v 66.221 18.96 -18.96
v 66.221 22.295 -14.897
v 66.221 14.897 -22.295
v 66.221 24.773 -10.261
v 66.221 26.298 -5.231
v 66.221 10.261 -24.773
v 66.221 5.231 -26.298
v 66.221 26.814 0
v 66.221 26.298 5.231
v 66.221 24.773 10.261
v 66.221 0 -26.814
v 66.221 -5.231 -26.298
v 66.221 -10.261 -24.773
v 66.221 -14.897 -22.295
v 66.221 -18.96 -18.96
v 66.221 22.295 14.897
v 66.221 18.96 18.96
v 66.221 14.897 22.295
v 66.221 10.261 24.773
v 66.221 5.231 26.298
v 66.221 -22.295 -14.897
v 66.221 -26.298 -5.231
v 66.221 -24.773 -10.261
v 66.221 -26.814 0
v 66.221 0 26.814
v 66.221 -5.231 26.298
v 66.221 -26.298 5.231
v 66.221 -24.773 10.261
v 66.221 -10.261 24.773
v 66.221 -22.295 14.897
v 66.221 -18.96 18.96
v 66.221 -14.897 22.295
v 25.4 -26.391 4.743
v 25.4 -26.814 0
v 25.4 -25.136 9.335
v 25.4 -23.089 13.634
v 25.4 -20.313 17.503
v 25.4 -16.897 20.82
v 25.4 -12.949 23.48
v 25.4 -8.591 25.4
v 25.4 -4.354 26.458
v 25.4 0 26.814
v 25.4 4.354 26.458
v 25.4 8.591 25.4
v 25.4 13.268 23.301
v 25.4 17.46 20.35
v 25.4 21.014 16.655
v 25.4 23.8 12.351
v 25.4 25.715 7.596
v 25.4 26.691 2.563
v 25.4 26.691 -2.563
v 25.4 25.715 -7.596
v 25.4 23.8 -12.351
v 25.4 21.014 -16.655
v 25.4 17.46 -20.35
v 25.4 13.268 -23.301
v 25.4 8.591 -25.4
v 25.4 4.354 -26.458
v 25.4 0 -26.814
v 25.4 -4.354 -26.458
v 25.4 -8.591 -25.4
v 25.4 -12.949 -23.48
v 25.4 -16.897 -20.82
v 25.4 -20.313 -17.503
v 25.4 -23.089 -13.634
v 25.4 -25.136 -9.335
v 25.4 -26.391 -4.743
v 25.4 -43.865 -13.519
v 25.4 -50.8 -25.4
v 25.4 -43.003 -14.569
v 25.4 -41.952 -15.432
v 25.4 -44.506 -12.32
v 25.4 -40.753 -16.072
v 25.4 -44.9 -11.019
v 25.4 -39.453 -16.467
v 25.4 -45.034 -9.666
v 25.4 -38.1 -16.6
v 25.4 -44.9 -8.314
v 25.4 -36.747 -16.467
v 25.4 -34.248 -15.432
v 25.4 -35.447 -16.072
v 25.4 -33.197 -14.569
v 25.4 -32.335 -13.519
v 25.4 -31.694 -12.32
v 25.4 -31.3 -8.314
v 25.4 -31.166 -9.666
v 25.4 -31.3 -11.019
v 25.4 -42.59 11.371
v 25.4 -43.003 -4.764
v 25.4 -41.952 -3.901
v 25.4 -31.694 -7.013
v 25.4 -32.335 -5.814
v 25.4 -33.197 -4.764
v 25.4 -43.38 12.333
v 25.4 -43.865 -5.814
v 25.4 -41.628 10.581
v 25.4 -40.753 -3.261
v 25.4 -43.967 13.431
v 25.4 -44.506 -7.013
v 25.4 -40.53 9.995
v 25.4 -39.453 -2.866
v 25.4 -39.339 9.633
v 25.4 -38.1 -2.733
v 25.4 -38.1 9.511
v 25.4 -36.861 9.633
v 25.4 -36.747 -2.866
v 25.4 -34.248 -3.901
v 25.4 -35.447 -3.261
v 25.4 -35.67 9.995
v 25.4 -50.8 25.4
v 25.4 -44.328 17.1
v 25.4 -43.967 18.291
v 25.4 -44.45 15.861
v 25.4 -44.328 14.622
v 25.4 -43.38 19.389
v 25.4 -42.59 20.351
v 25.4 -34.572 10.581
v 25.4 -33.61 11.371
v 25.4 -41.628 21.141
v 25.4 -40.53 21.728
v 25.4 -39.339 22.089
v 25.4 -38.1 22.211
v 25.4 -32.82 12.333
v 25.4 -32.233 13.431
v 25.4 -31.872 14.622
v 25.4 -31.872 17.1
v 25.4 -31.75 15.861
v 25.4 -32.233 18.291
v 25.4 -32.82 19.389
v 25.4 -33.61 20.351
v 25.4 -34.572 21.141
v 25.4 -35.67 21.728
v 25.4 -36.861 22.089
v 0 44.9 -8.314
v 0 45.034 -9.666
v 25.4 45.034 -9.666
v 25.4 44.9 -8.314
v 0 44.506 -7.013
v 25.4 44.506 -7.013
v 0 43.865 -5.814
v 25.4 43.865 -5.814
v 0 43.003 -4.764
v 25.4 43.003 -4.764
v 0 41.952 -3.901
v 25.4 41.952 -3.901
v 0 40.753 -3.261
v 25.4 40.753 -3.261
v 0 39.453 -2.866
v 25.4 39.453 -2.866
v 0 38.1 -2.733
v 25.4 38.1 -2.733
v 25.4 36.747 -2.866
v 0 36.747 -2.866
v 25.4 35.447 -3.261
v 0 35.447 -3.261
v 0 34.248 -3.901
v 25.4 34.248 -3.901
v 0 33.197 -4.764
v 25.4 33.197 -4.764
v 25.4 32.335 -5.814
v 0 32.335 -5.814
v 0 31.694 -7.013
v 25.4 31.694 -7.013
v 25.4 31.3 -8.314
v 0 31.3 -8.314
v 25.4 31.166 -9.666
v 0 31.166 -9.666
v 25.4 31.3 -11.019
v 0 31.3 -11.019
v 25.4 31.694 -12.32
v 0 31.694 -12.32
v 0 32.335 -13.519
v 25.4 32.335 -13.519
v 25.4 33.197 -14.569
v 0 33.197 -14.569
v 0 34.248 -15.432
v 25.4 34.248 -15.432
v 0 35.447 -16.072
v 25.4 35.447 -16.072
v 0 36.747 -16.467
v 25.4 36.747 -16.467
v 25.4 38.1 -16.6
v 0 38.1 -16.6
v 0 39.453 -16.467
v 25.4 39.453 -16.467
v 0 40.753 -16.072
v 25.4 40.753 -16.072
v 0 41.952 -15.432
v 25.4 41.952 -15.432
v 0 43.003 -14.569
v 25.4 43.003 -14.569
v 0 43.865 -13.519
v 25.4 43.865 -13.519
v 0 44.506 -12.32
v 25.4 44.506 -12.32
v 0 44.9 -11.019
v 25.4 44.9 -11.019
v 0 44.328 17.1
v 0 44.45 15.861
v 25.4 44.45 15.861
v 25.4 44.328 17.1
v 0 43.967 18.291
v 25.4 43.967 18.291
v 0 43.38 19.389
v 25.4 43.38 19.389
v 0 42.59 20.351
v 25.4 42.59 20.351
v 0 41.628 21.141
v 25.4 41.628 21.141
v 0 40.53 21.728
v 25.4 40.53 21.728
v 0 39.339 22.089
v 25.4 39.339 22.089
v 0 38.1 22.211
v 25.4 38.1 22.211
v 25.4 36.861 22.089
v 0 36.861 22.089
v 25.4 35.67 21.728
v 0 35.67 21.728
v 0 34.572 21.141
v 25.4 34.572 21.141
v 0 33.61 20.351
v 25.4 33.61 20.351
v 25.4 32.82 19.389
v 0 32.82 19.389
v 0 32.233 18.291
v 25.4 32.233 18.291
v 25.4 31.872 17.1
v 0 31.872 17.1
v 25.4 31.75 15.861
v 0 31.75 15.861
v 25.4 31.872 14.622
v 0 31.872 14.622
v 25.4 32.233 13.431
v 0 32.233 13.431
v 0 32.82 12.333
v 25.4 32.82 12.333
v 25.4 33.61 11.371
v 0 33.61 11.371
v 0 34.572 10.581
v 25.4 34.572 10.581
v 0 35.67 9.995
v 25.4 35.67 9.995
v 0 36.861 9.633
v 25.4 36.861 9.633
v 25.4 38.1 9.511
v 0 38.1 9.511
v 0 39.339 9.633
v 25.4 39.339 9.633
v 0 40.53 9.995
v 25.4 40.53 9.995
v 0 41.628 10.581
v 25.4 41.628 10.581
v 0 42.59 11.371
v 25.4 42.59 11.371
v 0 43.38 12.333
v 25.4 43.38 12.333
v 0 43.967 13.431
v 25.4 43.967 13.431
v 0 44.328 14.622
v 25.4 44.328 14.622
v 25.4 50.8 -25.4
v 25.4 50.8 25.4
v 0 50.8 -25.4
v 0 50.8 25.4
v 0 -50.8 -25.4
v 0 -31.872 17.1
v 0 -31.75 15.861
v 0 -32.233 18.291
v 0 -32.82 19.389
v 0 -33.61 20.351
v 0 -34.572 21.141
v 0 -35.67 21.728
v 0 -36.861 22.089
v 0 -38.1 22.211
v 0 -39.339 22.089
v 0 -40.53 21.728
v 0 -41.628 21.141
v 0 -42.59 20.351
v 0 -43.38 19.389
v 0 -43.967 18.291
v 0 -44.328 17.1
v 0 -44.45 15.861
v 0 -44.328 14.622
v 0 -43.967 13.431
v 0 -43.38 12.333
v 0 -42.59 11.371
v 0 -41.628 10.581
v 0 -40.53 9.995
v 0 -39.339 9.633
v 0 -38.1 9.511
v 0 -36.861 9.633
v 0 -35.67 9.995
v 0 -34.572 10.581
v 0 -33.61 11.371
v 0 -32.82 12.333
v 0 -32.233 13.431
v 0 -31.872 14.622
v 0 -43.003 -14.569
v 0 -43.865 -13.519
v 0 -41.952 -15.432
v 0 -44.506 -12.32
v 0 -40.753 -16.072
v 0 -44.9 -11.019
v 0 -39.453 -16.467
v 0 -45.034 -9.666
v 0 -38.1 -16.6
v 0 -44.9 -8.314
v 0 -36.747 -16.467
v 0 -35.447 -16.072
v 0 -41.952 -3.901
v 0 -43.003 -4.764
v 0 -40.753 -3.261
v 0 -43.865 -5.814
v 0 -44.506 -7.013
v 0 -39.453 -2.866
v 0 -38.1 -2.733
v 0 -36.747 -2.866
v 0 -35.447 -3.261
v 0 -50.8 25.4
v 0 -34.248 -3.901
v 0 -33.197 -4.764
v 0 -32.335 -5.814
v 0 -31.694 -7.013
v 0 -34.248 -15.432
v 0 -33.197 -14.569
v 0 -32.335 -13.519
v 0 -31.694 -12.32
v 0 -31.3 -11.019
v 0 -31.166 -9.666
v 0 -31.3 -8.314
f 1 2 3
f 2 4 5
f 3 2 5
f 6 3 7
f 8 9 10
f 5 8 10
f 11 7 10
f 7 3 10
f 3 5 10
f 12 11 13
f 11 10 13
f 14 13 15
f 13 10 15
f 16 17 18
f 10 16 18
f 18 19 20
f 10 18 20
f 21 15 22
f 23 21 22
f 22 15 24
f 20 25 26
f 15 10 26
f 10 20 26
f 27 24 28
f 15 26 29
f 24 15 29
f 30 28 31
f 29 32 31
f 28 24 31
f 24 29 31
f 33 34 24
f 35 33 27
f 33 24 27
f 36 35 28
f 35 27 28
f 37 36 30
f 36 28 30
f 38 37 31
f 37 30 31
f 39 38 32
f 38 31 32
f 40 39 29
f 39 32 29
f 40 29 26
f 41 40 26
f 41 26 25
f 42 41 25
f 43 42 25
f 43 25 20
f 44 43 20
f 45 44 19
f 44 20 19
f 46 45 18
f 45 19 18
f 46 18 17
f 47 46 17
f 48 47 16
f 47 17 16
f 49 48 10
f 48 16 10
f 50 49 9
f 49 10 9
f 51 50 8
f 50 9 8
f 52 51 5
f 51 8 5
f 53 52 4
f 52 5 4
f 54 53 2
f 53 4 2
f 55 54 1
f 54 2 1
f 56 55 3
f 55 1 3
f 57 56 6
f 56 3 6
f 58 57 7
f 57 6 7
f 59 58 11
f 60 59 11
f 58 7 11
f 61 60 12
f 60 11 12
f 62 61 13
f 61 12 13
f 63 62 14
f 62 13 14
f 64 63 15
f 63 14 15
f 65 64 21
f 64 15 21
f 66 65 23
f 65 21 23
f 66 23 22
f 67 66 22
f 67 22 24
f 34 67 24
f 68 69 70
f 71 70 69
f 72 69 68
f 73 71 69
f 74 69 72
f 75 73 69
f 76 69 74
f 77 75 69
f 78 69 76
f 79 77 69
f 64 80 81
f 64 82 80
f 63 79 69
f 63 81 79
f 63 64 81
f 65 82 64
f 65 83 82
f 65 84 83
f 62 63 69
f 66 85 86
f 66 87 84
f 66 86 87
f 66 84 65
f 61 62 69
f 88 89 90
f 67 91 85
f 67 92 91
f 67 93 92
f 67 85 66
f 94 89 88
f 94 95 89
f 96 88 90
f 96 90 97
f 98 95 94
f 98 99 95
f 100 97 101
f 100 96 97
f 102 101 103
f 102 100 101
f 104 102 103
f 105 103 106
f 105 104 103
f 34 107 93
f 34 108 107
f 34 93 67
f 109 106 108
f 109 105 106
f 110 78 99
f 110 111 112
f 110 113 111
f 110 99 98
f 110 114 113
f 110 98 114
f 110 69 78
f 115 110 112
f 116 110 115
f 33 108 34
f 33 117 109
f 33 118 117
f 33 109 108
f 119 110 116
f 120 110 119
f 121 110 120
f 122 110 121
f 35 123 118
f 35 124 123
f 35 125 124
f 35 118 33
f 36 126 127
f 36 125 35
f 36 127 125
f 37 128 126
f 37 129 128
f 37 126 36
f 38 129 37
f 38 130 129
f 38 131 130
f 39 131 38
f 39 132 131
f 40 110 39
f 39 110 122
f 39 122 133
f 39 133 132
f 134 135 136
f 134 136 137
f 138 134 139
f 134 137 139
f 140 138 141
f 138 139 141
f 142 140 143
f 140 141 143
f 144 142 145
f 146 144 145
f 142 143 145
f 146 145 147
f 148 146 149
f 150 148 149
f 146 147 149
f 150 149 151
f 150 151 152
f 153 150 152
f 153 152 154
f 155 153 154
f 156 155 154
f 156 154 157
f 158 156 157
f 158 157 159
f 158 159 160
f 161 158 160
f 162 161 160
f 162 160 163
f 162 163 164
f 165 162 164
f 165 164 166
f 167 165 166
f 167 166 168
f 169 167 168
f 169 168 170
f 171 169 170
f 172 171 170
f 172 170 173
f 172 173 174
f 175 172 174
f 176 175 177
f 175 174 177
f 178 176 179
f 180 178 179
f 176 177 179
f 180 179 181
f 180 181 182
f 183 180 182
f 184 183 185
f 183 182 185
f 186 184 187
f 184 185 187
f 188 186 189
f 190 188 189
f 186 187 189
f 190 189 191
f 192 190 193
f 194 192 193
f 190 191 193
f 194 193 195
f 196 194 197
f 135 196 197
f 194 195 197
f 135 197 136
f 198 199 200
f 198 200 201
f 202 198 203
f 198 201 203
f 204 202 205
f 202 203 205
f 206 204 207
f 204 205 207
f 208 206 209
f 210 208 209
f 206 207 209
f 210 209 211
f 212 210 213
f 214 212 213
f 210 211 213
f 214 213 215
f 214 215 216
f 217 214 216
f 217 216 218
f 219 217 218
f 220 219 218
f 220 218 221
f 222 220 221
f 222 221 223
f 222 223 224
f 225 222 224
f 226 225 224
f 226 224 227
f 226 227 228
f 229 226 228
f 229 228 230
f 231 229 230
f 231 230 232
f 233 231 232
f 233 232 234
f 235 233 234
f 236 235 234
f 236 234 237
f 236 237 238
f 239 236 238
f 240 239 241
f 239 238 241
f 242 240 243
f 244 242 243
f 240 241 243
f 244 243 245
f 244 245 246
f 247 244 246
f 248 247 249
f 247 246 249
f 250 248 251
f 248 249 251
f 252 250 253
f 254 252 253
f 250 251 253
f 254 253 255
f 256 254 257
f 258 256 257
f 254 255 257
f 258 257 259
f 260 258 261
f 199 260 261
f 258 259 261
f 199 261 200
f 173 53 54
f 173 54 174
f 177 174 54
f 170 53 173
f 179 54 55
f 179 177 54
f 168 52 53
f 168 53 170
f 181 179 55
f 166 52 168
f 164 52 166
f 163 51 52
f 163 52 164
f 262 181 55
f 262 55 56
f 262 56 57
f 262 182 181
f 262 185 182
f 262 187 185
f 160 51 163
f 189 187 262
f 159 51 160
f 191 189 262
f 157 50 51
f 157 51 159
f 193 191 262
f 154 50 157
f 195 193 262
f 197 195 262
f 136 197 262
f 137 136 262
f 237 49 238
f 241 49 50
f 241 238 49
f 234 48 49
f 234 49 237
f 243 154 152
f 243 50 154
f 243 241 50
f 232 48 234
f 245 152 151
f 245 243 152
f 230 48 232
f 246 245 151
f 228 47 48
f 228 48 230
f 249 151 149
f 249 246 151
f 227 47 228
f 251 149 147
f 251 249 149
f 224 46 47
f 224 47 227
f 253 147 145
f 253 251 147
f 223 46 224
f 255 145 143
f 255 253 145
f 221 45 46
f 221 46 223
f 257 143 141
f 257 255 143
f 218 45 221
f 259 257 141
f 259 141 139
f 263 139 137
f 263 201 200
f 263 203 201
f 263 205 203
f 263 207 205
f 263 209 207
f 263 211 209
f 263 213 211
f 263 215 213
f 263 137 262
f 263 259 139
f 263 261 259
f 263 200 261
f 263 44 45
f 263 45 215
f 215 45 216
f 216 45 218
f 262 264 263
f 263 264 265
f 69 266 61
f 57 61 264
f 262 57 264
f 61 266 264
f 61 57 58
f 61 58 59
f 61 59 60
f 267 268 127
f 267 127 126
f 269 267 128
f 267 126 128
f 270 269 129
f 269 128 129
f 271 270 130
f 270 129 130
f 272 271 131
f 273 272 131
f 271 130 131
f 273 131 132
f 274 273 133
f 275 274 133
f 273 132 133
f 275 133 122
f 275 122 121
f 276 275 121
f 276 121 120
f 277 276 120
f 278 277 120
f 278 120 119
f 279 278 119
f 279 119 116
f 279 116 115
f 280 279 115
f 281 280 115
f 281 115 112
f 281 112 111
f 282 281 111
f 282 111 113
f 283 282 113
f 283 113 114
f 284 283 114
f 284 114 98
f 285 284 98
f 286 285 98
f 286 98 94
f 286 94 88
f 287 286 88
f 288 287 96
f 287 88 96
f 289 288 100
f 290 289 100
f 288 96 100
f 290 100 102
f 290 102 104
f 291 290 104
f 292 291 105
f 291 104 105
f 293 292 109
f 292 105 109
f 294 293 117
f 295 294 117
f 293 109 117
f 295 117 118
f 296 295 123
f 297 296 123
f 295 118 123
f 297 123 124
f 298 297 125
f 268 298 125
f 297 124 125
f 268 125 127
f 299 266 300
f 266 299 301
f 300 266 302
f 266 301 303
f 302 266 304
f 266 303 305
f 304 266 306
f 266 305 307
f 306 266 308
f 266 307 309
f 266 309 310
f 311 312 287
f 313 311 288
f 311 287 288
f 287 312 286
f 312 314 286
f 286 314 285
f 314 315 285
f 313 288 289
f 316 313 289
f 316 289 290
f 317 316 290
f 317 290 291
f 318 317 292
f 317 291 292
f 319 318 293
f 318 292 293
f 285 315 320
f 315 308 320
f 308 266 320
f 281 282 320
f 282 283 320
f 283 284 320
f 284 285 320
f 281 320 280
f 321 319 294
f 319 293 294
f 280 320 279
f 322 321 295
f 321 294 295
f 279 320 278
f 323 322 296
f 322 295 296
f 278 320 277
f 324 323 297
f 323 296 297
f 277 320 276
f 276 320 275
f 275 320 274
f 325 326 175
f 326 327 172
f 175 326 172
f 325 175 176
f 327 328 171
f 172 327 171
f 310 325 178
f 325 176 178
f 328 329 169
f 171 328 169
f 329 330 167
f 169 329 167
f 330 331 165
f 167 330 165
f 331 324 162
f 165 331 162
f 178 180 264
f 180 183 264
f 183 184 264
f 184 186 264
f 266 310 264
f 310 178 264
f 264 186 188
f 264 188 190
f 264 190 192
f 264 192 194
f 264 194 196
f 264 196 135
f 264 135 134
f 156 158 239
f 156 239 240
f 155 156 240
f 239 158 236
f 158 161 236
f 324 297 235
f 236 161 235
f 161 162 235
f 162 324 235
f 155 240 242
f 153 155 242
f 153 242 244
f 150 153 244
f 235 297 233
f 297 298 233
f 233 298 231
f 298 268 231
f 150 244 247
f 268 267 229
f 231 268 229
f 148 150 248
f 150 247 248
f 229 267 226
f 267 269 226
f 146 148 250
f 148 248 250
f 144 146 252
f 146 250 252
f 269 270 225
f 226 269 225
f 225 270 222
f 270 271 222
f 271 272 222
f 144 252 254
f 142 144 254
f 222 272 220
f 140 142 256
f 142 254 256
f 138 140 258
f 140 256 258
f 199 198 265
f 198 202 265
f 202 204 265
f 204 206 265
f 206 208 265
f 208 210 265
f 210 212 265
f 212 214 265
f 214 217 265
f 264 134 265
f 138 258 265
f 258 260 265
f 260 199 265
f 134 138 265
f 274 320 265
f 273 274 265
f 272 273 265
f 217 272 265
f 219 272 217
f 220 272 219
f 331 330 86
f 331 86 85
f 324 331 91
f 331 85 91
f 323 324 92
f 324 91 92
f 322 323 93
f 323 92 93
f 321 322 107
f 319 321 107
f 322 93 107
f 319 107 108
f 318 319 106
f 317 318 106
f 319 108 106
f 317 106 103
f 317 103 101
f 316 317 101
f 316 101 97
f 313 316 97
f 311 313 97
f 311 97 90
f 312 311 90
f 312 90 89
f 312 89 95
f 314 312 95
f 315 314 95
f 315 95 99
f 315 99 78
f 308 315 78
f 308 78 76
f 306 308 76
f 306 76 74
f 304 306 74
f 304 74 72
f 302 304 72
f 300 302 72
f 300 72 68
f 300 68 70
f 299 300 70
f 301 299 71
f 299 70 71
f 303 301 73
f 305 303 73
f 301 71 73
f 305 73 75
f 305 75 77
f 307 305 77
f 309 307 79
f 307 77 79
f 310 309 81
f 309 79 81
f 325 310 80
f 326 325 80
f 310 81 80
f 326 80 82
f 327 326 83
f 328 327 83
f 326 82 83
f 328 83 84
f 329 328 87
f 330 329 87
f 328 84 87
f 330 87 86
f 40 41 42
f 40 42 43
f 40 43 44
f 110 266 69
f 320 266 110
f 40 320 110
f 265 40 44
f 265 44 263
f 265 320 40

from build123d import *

# Parameters (mm, degrees)
F0_W     = 101.6
F0_H     = 50.8
F1_DEPTH = 25.4
F2_R     = 6.35
F2_R_2   = 6.933717
F3_DEPTH = 25.401
F4_W     = 40.821289
F4_H     = 26.813686


with BuildPart() as f1:
    # F0 (on Right) → F1 (new body)
    with BuildSketch(Plane.YZ):
        Rectangle(F0_W, F0_H)
    extrude(amount=F1_DEPTH)

    # F2 (on face) → F3 (cut, through all)
    with BuildSketch(Plane.YZ.offset(25.4)):
        with Locations((-38.1, 15.86114)):
            Circle(F2_R)
        with Locations((38.1, 15.86114)):
            Circle(F2_R)
        with Locations((38.1, -9.666498)):
            Circle(F2_R_2)
        with Locations((-38.1, -9.666498)):
            Circle(F2_R_2)
    extrude(amount=-F3_DEPTH, mode=Mode.SUBTRACT)

    # F4 (on Top) → F5 (revolve)
    with BuildSketch(Plane.XY):
        with Locations((45.810644, -13.406843)):
            Rectangle(F4_W, F4_H)
    revolve(axis=Axis((45.810645, 0, 0), (-1, 0, 0)))


solid = f1.part
